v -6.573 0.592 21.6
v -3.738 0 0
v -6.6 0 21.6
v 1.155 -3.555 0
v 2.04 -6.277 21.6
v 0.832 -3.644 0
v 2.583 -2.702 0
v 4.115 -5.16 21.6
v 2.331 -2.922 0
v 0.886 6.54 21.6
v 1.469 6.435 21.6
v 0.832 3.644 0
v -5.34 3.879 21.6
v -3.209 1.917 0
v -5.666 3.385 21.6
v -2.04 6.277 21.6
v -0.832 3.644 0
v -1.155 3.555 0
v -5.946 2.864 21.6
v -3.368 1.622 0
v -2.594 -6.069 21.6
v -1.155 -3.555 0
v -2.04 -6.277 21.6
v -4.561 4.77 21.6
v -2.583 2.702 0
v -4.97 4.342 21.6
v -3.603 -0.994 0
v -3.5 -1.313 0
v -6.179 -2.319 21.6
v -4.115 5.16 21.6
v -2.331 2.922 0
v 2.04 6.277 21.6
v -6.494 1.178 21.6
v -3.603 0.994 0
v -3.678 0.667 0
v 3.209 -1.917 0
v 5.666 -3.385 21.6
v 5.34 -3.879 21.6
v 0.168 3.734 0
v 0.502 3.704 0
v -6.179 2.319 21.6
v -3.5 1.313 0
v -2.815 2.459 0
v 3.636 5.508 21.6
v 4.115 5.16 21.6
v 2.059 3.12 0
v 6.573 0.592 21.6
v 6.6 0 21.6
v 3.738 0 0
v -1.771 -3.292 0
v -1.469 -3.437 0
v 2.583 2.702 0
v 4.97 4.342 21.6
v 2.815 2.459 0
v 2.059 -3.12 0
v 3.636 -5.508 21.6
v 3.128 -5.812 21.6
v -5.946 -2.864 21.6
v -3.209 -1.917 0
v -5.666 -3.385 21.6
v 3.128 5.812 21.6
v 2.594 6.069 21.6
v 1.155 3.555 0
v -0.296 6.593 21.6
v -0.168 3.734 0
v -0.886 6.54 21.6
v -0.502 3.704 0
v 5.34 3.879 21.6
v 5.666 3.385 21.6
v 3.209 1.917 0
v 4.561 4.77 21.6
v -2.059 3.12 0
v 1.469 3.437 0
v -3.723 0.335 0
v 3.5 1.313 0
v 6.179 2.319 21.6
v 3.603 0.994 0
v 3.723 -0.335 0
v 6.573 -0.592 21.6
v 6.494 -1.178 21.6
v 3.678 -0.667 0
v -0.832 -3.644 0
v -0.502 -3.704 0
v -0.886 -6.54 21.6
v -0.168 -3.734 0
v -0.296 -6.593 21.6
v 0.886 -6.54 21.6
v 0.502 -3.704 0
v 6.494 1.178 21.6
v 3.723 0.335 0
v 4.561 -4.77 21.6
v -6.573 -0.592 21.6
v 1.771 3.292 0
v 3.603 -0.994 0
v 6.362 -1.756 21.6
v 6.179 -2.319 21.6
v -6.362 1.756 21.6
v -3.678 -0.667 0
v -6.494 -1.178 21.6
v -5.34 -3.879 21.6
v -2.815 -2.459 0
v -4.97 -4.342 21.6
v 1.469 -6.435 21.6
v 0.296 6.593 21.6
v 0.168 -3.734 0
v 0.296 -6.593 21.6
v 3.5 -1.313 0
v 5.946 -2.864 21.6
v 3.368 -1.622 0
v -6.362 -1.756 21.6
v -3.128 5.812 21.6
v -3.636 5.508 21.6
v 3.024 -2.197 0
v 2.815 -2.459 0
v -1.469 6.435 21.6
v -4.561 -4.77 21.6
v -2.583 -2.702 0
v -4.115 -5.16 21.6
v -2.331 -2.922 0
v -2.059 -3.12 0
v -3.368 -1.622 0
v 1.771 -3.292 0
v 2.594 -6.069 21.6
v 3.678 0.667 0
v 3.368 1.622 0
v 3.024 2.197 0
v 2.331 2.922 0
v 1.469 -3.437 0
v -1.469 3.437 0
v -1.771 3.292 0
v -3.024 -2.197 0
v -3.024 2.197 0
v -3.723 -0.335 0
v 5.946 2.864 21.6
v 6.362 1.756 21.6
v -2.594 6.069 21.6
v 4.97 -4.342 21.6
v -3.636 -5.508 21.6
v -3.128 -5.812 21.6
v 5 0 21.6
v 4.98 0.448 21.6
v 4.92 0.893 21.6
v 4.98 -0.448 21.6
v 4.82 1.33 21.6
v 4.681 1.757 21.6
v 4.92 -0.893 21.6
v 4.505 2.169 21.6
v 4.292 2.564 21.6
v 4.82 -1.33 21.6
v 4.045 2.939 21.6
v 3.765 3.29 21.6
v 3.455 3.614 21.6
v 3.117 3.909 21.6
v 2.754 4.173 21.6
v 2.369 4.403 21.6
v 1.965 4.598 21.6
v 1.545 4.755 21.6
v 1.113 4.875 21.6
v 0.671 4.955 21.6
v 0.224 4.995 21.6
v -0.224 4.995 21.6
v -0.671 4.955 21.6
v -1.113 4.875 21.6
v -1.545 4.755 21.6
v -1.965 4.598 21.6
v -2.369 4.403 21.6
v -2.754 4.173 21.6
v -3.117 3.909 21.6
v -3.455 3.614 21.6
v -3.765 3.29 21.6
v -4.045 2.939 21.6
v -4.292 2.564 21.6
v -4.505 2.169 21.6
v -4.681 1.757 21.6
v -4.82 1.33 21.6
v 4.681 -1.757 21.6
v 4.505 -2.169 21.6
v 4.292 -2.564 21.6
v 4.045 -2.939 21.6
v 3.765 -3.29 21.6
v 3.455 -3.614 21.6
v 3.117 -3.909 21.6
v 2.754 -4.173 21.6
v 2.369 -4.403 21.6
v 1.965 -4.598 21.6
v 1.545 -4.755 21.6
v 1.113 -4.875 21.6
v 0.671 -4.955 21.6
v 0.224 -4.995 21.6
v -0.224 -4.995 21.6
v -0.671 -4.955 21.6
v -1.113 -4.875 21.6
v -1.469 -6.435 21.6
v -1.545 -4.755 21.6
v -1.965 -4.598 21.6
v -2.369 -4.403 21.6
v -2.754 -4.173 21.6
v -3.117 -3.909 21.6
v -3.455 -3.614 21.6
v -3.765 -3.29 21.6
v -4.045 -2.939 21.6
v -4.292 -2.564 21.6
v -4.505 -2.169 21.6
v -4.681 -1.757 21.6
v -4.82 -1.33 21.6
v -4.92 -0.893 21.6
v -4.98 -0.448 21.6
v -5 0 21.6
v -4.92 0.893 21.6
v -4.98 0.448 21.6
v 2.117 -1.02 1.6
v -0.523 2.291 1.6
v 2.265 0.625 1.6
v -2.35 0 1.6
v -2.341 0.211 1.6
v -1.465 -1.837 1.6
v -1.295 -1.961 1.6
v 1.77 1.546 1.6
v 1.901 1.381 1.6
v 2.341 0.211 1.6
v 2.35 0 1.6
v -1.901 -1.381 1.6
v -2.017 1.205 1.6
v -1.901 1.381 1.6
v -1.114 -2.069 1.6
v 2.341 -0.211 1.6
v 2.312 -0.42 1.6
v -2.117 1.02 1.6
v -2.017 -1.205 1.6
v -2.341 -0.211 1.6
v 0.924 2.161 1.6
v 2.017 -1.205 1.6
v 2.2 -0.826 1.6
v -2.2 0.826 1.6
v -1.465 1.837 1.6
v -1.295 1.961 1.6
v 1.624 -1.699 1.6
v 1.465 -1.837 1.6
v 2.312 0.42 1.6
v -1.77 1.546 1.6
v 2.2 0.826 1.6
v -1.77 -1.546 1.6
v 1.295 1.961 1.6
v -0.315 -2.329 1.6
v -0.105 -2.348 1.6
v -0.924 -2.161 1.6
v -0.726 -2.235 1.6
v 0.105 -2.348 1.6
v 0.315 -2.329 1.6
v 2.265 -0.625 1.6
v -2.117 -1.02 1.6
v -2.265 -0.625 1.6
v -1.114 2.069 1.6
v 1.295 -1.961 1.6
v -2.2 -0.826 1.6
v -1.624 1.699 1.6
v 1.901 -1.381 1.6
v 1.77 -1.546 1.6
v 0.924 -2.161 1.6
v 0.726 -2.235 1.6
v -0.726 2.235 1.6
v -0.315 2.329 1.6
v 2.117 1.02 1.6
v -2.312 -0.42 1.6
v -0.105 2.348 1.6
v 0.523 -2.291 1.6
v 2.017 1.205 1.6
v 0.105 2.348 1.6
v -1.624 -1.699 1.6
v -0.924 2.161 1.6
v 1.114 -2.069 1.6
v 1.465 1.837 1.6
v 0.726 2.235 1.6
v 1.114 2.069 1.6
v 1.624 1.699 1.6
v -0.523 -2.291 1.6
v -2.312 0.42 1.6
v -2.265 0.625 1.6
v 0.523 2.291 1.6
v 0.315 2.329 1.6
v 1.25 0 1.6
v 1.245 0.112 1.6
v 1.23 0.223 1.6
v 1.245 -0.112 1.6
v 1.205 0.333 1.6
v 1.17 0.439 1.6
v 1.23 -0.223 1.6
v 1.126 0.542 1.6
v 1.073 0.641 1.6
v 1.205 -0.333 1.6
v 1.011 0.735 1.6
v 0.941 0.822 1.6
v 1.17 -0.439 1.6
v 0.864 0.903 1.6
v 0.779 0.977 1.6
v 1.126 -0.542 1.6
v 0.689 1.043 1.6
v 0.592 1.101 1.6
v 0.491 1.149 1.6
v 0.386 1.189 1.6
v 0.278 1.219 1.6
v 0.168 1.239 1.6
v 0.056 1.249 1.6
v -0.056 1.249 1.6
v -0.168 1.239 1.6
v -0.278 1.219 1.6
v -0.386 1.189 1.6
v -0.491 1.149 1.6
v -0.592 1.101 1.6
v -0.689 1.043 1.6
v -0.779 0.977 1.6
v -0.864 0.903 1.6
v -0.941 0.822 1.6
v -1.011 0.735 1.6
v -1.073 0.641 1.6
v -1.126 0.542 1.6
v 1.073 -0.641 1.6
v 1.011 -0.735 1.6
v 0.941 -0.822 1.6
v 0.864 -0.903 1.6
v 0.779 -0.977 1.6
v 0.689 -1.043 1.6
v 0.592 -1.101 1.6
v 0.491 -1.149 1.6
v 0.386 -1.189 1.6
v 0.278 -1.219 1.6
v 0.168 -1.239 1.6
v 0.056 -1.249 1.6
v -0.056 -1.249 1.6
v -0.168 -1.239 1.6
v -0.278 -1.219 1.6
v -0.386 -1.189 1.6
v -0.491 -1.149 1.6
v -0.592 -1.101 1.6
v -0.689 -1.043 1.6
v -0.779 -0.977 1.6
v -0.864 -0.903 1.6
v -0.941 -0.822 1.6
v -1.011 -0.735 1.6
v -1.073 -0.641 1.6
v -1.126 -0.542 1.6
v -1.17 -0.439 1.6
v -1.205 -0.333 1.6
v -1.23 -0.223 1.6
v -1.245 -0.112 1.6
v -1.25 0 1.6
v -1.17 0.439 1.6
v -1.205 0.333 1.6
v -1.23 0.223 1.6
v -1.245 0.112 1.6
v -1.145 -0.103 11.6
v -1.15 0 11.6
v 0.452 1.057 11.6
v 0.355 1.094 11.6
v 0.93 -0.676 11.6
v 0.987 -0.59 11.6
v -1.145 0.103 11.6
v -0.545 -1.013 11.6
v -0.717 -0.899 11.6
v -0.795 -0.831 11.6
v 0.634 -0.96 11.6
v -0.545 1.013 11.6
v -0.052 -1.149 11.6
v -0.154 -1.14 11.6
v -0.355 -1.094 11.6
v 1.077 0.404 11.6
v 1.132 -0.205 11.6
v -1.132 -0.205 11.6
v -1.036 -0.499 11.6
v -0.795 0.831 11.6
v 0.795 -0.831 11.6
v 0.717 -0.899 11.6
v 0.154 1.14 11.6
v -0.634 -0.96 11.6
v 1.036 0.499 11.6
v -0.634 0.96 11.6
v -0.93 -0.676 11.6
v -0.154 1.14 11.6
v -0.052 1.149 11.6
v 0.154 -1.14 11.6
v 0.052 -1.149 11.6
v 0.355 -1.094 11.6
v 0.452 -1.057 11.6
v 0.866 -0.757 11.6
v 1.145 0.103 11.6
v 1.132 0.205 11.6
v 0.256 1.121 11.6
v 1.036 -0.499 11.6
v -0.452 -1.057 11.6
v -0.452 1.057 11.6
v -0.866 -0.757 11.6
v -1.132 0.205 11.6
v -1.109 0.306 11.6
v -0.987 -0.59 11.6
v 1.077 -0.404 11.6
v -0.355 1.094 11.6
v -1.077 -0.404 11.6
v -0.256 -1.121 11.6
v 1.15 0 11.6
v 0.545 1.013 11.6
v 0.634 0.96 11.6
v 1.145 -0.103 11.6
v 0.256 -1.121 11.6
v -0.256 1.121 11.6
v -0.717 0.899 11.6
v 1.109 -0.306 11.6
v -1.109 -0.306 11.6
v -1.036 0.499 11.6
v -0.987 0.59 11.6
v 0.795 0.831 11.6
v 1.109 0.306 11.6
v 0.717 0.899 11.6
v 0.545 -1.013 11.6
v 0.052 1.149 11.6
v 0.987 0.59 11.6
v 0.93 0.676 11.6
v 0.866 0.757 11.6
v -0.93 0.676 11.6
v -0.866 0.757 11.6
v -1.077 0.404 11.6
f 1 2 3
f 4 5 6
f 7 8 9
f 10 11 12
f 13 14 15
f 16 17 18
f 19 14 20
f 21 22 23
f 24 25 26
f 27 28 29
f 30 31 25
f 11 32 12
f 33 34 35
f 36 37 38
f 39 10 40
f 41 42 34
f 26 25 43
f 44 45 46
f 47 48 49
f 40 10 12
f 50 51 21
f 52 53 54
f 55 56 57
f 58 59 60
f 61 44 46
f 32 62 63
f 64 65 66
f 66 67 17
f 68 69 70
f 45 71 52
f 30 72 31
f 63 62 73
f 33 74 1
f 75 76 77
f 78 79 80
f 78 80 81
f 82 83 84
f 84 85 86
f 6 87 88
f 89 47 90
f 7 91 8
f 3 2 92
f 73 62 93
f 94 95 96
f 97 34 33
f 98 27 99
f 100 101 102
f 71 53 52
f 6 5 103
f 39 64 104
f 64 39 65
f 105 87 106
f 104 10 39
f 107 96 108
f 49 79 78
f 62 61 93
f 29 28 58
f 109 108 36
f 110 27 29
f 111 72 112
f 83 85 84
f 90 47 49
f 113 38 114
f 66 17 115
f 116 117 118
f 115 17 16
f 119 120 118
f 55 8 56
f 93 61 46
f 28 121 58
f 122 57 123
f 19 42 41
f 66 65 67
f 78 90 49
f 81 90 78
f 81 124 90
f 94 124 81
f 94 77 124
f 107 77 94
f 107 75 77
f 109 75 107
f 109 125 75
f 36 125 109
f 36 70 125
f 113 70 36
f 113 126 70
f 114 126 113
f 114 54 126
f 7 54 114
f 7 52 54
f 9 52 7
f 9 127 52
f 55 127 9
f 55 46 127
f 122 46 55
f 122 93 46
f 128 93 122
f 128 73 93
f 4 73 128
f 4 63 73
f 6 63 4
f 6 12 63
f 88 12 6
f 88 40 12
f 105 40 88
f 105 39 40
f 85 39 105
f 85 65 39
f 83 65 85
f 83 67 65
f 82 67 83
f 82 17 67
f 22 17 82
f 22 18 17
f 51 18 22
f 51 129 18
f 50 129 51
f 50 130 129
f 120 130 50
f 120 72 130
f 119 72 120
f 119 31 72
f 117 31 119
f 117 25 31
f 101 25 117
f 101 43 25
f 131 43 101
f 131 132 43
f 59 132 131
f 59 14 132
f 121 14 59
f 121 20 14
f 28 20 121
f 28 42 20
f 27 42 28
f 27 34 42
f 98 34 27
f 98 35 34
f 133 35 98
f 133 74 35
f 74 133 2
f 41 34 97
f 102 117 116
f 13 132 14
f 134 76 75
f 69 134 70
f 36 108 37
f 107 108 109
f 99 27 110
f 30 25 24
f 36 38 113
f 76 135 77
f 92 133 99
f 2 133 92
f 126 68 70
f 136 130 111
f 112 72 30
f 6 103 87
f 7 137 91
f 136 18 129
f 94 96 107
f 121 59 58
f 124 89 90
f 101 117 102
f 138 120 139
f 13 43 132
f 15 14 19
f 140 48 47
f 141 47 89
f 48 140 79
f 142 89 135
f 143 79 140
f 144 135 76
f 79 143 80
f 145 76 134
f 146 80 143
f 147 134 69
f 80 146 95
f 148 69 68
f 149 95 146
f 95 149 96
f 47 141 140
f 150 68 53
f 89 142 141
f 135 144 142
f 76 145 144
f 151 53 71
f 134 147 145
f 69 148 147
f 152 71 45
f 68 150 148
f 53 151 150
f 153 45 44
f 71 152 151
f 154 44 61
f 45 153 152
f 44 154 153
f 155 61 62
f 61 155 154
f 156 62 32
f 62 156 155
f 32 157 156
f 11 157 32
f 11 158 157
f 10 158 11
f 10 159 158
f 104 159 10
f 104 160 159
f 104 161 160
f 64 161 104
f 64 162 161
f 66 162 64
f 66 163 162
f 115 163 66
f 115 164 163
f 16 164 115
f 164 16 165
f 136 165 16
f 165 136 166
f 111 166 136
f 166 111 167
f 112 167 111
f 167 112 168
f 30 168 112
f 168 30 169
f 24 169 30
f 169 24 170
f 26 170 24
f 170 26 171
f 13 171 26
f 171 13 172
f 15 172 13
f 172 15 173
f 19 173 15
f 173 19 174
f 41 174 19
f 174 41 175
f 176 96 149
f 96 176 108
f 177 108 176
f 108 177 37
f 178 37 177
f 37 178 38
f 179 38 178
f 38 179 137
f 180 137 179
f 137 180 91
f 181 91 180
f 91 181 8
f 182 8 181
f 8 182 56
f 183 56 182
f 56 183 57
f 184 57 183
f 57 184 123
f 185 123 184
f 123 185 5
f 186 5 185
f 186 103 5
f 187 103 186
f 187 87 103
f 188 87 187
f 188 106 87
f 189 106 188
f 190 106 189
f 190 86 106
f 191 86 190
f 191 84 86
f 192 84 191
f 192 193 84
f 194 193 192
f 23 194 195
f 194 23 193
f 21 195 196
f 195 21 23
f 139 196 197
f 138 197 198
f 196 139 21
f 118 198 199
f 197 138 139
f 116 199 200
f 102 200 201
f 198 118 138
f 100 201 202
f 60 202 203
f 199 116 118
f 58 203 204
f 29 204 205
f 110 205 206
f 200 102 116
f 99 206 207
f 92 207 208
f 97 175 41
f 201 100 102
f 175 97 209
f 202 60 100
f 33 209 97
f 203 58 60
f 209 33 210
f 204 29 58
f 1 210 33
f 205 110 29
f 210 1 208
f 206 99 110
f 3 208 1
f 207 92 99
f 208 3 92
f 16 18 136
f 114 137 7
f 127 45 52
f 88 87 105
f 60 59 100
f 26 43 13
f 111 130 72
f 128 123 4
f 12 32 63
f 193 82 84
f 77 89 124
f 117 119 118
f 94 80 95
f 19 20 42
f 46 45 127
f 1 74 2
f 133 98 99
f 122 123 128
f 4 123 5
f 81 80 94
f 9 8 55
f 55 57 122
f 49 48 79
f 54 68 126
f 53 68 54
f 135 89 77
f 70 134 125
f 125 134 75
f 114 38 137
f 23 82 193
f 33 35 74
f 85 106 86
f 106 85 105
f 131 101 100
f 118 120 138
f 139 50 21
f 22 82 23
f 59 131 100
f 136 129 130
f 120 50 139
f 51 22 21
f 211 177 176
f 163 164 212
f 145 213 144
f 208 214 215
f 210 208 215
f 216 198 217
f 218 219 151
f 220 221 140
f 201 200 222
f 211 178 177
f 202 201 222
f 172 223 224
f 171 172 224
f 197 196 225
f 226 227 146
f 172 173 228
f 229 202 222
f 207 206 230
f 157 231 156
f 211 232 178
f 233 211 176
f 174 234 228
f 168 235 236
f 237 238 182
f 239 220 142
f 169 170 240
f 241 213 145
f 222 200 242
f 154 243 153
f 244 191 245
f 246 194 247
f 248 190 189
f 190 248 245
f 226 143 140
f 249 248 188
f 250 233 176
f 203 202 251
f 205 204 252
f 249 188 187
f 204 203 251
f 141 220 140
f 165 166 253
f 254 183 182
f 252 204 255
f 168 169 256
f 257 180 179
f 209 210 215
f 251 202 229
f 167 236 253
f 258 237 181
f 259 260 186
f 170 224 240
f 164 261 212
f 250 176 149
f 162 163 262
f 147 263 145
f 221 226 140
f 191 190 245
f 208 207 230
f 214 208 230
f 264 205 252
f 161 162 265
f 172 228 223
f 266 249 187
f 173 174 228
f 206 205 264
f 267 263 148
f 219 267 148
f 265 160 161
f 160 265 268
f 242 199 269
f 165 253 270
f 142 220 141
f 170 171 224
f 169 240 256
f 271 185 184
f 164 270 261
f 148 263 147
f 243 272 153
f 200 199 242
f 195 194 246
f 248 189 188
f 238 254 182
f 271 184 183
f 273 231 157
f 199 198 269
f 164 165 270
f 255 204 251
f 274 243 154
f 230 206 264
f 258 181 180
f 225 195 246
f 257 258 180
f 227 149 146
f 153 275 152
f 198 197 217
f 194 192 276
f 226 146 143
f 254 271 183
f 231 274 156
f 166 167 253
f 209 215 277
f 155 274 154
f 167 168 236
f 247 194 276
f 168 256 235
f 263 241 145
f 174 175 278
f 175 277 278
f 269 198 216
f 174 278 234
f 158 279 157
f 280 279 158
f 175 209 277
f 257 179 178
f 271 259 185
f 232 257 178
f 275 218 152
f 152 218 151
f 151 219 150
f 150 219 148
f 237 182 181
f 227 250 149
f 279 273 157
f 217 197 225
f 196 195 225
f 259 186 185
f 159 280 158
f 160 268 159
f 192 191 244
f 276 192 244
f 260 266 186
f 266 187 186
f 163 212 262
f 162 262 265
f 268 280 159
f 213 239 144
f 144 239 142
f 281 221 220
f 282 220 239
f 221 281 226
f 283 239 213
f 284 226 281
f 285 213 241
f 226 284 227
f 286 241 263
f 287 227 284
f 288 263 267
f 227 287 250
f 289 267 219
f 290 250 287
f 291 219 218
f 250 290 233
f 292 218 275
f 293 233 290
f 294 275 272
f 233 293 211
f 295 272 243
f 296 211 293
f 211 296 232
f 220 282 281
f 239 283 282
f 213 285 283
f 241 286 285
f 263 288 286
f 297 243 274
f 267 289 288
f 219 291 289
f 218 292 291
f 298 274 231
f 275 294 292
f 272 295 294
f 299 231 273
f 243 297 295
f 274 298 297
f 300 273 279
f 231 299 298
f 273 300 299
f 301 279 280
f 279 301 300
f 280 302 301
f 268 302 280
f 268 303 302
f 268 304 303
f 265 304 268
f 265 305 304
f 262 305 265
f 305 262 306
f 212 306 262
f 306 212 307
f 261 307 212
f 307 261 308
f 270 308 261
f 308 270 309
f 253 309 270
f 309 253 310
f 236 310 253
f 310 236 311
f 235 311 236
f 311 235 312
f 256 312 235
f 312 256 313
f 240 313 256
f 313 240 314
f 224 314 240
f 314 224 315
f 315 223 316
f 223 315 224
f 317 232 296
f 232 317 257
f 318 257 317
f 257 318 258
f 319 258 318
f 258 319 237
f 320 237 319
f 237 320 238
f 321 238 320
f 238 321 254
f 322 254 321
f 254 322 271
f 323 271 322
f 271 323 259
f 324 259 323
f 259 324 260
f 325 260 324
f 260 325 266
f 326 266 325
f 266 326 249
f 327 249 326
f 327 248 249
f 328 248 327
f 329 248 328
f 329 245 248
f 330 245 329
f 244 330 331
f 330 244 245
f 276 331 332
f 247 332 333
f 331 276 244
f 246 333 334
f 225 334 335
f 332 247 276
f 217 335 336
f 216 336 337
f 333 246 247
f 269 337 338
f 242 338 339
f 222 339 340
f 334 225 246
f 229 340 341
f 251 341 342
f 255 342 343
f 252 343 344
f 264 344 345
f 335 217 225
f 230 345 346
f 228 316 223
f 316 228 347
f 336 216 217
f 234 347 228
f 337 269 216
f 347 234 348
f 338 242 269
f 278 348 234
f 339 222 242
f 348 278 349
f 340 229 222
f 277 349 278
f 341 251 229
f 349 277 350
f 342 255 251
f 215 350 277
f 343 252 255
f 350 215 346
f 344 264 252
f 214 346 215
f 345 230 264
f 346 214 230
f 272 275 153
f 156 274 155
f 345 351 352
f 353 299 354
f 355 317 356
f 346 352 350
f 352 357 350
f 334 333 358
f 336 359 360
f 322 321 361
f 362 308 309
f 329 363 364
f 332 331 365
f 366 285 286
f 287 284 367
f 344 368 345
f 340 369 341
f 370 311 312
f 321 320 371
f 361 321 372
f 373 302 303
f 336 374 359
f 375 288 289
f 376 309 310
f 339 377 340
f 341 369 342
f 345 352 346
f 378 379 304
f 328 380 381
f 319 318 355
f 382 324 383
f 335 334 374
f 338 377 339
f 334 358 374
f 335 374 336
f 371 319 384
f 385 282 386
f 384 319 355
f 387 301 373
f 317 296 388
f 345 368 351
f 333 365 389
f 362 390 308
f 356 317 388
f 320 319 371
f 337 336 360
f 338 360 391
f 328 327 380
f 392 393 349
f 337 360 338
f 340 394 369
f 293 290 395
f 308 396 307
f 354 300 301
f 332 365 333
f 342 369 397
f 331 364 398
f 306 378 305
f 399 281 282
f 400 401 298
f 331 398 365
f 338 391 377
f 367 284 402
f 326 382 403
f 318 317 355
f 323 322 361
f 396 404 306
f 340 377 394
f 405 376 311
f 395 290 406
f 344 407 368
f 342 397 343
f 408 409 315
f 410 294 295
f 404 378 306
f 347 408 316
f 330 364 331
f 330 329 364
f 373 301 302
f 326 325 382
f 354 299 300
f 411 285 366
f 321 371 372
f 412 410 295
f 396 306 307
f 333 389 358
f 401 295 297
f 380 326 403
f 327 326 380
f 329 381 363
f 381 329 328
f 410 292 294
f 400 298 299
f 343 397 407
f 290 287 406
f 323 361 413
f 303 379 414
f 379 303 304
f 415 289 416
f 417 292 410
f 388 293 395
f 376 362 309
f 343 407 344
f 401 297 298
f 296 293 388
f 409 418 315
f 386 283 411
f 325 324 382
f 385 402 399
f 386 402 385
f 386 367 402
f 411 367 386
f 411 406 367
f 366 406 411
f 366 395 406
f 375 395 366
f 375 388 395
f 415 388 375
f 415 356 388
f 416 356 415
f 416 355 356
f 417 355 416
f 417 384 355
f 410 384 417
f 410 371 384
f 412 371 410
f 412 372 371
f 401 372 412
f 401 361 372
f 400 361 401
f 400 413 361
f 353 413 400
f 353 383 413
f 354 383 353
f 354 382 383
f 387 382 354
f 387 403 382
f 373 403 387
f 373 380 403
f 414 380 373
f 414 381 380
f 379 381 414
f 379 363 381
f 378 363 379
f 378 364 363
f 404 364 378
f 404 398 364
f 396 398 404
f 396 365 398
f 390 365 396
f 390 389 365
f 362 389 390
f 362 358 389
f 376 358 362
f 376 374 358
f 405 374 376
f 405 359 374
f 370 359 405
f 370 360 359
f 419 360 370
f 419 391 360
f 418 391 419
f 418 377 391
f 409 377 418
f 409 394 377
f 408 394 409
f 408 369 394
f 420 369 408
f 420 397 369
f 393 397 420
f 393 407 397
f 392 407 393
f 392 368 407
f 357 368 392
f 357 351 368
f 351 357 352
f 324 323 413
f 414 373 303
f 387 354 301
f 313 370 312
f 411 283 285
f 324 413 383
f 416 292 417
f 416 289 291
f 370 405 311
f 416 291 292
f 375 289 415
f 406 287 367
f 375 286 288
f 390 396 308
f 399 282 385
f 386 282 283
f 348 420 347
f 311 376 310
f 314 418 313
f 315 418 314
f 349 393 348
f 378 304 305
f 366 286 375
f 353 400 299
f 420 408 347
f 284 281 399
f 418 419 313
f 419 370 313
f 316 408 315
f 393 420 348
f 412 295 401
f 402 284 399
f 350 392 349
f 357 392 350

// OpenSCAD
//tip outer diameter
top_od = 4.5;
//1cm down outer diameter
one_cm_od = 7.15 ;
//inner diameter of opening
top_id = 2.3;
//thickness of walls in the x-y axis
wall_thickness = 1.6;
//height of cap (not including wall thickness)
height = 20;
//ammount your 3d printer erodes holes and dialates outer diameters.
compensation_factor = 0.2;



cf = compensation_factor*1;
slope = (one_cm_od-top_od)/10;

translate([0,0,height+wall_thickness])
rotate([0, 180, 0])
union() {
	difference() {
		cylinder(h=height+wall_thickness,d1=top_od+cf+slope*height+2*wall_thickness,
			d2=top_od+cf+2*wall_thickness-wall_thickness*slope,$fn=70);
		cylinder(h=height,d1=top_od+cf+slope*height,d2=top_od+cf,$fn=70);
	}
	translate([0, 0, height-10])
	cylinder(h=10,d1=top_id,d2=top_id+cf,$fn=70 );
}
